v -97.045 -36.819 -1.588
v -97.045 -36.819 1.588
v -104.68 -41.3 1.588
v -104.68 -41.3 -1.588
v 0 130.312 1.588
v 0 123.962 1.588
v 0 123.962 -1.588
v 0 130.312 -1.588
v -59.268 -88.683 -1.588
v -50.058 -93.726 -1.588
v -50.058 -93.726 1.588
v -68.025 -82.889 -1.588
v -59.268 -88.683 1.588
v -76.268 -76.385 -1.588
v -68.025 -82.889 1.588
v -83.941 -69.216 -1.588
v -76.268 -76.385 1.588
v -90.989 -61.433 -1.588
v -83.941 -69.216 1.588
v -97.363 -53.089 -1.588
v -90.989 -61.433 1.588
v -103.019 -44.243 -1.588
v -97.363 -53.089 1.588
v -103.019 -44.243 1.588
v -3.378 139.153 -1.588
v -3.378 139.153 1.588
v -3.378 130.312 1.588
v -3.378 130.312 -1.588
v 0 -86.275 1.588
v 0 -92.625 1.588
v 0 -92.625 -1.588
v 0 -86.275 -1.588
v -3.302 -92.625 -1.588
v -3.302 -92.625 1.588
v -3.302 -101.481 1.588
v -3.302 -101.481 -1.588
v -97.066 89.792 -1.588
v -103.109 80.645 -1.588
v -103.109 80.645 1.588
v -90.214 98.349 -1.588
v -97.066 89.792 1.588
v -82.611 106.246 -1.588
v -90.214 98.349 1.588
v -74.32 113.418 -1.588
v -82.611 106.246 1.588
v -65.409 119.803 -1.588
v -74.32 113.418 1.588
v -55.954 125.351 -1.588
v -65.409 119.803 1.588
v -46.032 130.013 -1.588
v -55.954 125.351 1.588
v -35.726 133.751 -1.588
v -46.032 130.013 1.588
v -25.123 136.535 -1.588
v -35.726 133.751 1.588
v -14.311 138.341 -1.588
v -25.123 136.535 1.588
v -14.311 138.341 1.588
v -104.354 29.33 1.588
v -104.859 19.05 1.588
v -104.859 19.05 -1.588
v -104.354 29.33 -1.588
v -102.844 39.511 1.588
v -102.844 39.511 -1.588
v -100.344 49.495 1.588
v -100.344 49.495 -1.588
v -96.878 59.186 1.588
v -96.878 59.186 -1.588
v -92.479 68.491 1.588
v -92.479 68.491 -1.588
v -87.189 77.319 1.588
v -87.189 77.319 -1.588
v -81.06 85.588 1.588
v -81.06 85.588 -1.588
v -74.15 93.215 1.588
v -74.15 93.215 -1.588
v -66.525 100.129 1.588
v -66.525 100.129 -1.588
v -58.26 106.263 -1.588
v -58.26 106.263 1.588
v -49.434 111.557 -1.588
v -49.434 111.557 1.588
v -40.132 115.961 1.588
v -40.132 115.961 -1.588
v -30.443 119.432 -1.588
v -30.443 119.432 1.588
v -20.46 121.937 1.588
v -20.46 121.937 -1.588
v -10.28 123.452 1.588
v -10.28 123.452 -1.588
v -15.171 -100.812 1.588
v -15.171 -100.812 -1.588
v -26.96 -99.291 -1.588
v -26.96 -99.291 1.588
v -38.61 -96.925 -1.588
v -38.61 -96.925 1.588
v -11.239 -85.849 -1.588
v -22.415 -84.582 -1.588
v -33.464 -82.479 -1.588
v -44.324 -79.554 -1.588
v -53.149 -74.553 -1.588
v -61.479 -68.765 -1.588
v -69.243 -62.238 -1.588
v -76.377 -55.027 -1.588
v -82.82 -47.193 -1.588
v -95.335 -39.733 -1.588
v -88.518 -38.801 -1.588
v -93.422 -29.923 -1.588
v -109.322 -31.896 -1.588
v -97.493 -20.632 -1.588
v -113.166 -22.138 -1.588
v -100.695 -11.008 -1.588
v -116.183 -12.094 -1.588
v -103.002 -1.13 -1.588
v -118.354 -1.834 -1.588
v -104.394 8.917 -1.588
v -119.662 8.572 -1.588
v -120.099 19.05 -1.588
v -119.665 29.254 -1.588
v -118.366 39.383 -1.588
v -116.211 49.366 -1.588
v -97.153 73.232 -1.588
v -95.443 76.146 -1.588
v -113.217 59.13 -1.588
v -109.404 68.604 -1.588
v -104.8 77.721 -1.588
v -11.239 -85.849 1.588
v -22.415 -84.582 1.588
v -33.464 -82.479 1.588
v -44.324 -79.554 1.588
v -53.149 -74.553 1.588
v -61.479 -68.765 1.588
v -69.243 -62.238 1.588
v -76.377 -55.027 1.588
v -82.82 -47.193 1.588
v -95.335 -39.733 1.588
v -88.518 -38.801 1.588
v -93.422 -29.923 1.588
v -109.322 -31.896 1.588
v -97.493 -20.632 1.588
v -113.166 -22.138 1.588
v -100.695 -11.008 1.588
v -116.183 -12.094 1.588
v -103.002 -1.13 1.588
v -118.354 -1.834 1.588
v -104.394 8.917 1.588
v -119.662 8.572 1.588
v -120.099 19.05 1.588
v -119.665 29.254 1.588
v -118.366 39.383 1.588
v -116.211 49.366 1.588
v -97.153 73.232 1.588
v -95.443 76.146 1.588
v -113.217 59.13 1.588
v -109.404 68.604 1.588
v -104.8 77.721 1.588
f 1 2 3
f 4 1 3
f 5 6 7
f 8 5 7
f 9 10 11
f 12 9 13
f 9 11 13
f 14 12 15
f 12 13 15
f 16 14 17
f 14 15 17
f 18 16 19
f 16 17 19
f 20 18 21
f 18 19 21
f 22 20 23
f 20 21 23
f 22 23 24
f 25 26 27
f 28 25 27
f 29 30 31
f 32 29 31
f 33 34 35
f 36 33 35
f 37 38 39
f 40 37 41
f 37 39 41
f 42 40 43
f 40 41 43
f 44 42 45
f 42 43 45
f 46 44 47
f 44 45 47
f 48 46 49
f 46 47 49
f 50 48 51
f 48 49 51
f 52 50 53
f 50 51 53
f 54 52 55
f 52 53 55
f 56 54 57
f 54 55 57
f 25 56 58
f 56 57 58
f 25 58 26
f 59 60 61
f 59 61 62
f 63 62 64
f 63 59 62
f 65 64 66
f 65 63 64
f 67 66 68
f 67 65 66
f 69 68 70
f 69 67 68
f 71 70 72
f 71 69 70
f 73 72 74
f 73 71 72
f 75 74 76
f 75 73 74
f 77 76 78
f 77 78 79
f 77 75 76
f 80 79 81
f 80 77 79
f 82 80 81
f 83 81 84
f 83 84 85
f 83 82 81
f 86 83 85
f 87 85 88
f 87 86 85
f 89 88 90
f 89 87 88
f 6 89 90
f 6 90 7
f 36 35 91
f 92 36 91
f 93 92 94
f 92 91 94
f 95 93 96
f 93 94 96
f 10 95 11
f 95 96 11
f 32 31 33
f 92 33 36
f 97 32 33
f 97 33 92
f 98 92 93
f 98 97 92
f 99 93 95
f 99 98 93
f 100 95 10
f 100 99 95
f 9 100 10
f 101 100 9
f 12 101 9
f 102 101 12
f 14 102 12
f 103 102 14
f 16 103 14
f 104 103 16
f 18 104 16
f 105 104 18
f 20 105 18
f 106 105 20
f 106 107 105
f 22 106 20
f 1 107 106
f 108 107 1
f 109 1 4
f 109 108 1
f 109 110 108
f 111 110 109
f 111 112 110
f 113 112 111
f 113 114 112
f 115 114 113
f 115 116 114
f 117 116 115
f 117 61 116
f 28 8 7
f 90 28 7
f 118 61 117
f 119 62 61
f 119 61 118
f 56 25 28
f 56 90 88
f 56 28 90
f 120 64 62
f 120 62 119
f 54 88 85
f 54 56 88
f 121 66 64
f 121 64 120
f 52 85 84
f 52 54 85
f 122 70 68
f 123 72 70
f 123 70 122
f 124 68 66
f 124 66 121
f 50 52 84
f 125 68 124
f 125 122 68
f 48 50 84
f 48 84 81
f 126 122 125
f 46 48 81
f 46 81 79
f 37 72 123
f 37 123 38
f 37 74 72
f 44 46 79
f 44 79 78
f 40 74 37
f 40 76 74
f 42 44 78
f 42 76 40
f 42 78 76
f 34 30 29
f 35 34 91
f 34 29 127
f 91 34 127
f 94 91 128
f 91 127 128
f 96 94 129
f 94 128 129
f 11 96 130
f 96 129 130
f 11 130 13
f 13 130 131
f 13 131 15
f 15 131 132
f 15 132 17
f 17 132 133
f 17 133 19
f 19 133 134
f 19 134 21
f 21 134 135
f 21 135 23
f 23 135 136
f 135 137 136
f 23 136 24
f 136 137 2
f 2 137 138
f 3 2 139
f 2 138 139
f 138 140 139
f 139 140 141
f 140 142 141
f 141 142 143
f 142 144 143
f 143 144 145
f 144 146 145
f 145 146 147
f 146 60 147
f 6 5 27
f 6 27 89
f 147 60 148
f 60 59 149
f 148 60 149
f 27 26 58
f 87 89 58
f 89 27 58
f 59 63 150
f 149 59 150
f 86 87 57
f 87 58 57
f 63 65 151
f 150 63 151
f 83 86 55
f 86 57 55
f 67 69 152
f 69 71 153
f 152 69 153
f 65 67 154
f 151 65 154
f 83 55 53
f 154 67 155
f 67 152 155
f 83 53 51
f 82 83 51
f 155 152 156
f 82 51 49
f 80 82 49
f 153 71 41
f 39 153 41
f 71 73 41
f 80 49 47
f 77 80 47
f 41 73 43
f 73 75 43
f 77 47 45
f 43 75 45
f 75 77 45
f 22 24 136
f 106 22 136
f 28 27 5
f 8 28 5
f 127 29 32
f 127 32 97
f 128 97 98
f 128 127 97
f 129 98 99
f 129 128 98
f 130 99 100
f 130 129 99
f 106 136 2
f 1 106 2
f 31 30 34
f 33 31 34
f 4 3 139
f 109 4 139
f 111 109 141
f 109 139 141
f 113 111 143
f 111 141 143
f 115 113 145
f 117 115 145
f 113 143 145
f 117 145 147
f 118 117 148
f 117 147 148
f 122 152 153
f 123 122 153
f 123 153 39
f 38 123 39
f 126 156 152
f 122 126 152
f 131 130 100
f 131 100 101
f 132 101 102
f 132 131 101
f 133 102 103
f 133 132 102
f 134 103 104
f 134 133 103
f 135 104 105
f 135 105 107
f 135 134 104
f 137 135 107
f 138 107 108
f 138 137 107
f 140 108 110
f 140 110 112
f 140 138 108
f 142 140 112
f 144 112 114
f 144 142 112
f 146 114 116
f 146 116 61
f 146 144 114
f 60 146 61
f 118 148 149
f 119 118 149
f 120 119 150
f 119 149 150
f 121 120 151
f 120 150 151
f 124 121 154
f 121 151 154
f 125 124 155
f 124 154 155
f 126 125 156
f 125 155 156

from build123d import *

# Parameters (mm, degrees)
BOSS_EXTRUDE1_DEPTH = 1.5875
SKETCH3_W           = 208.645691316
SKETCH3_H           = 383.026987577
CUT_EXTRUDE1_DEPTH  = 121.20569203
CUT_EXTRUDE2_DEPTH  = 4.175


with BuildPart() as part:
    # Sketch2 → Boss-Extrude1 (new body, symmetric)
    with BuildSketch(Plane.XY):
        with BuildLine():
            ThreePointArc((-120.098895727, 19.05), (0.406748907, 139.2017743), (120.203613722, 18.343301545))
            ThreePointArc((120.203613722, 18.343301545), (101.067699546, -47.629728931), (50.138751442, -93.726))
            ThreePointArc((50.138751442, -93.726), (0.040174098, -101.514794876), (-50.058403246, -93.726))
            ThreePointArc((-50.058403246, -93.726), (-101.163912713, -47.327889321), (-120.098895727, 19.05))
        make_face()
        with BuildLine():
            ThreePointArc((-104.858895727, 19.05), (0.361930242, 123.961840203), (104.963877332, 18.432938489))
            ThreePointArc((104.963877332, 18.432938489), (88.446745877, -39.065849025), (44.40486057, -79.553359885))
            ThreePointArc((44.40486057, -79.553359885), (0.040463589, -86.274794876), (-44.323959374, -79.553531384))
            ThreePointArc((-44.323959374, -79.553531384), (-88.517658334, -38.801393502), (-104.858895727, 19.05))
        make_face(mode=Mode.SUBTRACT)
    extrude(amount=BOSS_EXTRUDE1_DEPTH, both=True)

    # Sketch3 → Cut-Extrude1 (cut, through all)
    with BuildSketch(Plane(origin=(0, 0, 0), x_dir=(0, 0, -1), z_dir=(1, 0, 0))):
        with Locations((4.266053154, 20.866300598)):
            Rectangle(SKETCH3_W, SKETCH3_H)
    extrude(amount=CUT_EXTRUDE1_DEPTH, mode=Mode.SUBTRACT)

    # Sketch4 → Cut-Extrude2 (cut, through all)
    with BuildSketch(Plane.XY.offset(1.5875)):
        with BuildLine():
            Line((-95.442778735, 76.146002016), (-103.1094988, 80.645376586))
            ThreePointArc((-103.1094988, 80.645376586), (-103.96522962, 79.188995674), (-104.80040165, 77.720728574))
            Line((-104.80040165, 77.720728574), (-97.152639859, 73.232480062))
            Line((-97.152639859, 73.232480062), (-95.442778735, 76.146002016))
        make_face()
        with BuildLine():
            Line((-3.3782, 139.153279965), (-3.3782, 130.312293878))
            Line((-3.3782, 130.312293878), (0, 130.312293878))
            Line((0, 130.312293878), (0, 139.202282013))
            ThreePointArc((0, 139.202282013), (-1.689272244, 139.189655502), (-3.3782, 139.153279965))
        make_face()
        with BuildLine():
            Line((-97.044954451, -36.819436689), (-104.679734985, -41.300066711))
            ThreePointArc((-104.679734985, -41.300066711), (-103.859441192, -42.776931517), (-103.019390964, -44.242648808))
            Line((-103.019390964, -44.242648808), (-95.335093375, -39.732958671))
            Line((-95.335093375, -39.732958671), (-97.044954451, -36.819436689))
        make_face()
        with BuildLine():
            Line((-3.302, -92.624794876), (-3.302, -101.48094955))
            ThreePointArc((-3.302, -101.48094955), (-1.651084663, -101.506132106), (0, -101.514794876))
            Line((0, -101.514794876), (0, -92.624794876))
            Line((0, -92.624794876), (-3.302, -92.624794876))
        make_face()
    extrude(amount=-CUT_EXTRUDE2_DEPTH, mode=Mode.SUBTRACT)


solid = part.part
